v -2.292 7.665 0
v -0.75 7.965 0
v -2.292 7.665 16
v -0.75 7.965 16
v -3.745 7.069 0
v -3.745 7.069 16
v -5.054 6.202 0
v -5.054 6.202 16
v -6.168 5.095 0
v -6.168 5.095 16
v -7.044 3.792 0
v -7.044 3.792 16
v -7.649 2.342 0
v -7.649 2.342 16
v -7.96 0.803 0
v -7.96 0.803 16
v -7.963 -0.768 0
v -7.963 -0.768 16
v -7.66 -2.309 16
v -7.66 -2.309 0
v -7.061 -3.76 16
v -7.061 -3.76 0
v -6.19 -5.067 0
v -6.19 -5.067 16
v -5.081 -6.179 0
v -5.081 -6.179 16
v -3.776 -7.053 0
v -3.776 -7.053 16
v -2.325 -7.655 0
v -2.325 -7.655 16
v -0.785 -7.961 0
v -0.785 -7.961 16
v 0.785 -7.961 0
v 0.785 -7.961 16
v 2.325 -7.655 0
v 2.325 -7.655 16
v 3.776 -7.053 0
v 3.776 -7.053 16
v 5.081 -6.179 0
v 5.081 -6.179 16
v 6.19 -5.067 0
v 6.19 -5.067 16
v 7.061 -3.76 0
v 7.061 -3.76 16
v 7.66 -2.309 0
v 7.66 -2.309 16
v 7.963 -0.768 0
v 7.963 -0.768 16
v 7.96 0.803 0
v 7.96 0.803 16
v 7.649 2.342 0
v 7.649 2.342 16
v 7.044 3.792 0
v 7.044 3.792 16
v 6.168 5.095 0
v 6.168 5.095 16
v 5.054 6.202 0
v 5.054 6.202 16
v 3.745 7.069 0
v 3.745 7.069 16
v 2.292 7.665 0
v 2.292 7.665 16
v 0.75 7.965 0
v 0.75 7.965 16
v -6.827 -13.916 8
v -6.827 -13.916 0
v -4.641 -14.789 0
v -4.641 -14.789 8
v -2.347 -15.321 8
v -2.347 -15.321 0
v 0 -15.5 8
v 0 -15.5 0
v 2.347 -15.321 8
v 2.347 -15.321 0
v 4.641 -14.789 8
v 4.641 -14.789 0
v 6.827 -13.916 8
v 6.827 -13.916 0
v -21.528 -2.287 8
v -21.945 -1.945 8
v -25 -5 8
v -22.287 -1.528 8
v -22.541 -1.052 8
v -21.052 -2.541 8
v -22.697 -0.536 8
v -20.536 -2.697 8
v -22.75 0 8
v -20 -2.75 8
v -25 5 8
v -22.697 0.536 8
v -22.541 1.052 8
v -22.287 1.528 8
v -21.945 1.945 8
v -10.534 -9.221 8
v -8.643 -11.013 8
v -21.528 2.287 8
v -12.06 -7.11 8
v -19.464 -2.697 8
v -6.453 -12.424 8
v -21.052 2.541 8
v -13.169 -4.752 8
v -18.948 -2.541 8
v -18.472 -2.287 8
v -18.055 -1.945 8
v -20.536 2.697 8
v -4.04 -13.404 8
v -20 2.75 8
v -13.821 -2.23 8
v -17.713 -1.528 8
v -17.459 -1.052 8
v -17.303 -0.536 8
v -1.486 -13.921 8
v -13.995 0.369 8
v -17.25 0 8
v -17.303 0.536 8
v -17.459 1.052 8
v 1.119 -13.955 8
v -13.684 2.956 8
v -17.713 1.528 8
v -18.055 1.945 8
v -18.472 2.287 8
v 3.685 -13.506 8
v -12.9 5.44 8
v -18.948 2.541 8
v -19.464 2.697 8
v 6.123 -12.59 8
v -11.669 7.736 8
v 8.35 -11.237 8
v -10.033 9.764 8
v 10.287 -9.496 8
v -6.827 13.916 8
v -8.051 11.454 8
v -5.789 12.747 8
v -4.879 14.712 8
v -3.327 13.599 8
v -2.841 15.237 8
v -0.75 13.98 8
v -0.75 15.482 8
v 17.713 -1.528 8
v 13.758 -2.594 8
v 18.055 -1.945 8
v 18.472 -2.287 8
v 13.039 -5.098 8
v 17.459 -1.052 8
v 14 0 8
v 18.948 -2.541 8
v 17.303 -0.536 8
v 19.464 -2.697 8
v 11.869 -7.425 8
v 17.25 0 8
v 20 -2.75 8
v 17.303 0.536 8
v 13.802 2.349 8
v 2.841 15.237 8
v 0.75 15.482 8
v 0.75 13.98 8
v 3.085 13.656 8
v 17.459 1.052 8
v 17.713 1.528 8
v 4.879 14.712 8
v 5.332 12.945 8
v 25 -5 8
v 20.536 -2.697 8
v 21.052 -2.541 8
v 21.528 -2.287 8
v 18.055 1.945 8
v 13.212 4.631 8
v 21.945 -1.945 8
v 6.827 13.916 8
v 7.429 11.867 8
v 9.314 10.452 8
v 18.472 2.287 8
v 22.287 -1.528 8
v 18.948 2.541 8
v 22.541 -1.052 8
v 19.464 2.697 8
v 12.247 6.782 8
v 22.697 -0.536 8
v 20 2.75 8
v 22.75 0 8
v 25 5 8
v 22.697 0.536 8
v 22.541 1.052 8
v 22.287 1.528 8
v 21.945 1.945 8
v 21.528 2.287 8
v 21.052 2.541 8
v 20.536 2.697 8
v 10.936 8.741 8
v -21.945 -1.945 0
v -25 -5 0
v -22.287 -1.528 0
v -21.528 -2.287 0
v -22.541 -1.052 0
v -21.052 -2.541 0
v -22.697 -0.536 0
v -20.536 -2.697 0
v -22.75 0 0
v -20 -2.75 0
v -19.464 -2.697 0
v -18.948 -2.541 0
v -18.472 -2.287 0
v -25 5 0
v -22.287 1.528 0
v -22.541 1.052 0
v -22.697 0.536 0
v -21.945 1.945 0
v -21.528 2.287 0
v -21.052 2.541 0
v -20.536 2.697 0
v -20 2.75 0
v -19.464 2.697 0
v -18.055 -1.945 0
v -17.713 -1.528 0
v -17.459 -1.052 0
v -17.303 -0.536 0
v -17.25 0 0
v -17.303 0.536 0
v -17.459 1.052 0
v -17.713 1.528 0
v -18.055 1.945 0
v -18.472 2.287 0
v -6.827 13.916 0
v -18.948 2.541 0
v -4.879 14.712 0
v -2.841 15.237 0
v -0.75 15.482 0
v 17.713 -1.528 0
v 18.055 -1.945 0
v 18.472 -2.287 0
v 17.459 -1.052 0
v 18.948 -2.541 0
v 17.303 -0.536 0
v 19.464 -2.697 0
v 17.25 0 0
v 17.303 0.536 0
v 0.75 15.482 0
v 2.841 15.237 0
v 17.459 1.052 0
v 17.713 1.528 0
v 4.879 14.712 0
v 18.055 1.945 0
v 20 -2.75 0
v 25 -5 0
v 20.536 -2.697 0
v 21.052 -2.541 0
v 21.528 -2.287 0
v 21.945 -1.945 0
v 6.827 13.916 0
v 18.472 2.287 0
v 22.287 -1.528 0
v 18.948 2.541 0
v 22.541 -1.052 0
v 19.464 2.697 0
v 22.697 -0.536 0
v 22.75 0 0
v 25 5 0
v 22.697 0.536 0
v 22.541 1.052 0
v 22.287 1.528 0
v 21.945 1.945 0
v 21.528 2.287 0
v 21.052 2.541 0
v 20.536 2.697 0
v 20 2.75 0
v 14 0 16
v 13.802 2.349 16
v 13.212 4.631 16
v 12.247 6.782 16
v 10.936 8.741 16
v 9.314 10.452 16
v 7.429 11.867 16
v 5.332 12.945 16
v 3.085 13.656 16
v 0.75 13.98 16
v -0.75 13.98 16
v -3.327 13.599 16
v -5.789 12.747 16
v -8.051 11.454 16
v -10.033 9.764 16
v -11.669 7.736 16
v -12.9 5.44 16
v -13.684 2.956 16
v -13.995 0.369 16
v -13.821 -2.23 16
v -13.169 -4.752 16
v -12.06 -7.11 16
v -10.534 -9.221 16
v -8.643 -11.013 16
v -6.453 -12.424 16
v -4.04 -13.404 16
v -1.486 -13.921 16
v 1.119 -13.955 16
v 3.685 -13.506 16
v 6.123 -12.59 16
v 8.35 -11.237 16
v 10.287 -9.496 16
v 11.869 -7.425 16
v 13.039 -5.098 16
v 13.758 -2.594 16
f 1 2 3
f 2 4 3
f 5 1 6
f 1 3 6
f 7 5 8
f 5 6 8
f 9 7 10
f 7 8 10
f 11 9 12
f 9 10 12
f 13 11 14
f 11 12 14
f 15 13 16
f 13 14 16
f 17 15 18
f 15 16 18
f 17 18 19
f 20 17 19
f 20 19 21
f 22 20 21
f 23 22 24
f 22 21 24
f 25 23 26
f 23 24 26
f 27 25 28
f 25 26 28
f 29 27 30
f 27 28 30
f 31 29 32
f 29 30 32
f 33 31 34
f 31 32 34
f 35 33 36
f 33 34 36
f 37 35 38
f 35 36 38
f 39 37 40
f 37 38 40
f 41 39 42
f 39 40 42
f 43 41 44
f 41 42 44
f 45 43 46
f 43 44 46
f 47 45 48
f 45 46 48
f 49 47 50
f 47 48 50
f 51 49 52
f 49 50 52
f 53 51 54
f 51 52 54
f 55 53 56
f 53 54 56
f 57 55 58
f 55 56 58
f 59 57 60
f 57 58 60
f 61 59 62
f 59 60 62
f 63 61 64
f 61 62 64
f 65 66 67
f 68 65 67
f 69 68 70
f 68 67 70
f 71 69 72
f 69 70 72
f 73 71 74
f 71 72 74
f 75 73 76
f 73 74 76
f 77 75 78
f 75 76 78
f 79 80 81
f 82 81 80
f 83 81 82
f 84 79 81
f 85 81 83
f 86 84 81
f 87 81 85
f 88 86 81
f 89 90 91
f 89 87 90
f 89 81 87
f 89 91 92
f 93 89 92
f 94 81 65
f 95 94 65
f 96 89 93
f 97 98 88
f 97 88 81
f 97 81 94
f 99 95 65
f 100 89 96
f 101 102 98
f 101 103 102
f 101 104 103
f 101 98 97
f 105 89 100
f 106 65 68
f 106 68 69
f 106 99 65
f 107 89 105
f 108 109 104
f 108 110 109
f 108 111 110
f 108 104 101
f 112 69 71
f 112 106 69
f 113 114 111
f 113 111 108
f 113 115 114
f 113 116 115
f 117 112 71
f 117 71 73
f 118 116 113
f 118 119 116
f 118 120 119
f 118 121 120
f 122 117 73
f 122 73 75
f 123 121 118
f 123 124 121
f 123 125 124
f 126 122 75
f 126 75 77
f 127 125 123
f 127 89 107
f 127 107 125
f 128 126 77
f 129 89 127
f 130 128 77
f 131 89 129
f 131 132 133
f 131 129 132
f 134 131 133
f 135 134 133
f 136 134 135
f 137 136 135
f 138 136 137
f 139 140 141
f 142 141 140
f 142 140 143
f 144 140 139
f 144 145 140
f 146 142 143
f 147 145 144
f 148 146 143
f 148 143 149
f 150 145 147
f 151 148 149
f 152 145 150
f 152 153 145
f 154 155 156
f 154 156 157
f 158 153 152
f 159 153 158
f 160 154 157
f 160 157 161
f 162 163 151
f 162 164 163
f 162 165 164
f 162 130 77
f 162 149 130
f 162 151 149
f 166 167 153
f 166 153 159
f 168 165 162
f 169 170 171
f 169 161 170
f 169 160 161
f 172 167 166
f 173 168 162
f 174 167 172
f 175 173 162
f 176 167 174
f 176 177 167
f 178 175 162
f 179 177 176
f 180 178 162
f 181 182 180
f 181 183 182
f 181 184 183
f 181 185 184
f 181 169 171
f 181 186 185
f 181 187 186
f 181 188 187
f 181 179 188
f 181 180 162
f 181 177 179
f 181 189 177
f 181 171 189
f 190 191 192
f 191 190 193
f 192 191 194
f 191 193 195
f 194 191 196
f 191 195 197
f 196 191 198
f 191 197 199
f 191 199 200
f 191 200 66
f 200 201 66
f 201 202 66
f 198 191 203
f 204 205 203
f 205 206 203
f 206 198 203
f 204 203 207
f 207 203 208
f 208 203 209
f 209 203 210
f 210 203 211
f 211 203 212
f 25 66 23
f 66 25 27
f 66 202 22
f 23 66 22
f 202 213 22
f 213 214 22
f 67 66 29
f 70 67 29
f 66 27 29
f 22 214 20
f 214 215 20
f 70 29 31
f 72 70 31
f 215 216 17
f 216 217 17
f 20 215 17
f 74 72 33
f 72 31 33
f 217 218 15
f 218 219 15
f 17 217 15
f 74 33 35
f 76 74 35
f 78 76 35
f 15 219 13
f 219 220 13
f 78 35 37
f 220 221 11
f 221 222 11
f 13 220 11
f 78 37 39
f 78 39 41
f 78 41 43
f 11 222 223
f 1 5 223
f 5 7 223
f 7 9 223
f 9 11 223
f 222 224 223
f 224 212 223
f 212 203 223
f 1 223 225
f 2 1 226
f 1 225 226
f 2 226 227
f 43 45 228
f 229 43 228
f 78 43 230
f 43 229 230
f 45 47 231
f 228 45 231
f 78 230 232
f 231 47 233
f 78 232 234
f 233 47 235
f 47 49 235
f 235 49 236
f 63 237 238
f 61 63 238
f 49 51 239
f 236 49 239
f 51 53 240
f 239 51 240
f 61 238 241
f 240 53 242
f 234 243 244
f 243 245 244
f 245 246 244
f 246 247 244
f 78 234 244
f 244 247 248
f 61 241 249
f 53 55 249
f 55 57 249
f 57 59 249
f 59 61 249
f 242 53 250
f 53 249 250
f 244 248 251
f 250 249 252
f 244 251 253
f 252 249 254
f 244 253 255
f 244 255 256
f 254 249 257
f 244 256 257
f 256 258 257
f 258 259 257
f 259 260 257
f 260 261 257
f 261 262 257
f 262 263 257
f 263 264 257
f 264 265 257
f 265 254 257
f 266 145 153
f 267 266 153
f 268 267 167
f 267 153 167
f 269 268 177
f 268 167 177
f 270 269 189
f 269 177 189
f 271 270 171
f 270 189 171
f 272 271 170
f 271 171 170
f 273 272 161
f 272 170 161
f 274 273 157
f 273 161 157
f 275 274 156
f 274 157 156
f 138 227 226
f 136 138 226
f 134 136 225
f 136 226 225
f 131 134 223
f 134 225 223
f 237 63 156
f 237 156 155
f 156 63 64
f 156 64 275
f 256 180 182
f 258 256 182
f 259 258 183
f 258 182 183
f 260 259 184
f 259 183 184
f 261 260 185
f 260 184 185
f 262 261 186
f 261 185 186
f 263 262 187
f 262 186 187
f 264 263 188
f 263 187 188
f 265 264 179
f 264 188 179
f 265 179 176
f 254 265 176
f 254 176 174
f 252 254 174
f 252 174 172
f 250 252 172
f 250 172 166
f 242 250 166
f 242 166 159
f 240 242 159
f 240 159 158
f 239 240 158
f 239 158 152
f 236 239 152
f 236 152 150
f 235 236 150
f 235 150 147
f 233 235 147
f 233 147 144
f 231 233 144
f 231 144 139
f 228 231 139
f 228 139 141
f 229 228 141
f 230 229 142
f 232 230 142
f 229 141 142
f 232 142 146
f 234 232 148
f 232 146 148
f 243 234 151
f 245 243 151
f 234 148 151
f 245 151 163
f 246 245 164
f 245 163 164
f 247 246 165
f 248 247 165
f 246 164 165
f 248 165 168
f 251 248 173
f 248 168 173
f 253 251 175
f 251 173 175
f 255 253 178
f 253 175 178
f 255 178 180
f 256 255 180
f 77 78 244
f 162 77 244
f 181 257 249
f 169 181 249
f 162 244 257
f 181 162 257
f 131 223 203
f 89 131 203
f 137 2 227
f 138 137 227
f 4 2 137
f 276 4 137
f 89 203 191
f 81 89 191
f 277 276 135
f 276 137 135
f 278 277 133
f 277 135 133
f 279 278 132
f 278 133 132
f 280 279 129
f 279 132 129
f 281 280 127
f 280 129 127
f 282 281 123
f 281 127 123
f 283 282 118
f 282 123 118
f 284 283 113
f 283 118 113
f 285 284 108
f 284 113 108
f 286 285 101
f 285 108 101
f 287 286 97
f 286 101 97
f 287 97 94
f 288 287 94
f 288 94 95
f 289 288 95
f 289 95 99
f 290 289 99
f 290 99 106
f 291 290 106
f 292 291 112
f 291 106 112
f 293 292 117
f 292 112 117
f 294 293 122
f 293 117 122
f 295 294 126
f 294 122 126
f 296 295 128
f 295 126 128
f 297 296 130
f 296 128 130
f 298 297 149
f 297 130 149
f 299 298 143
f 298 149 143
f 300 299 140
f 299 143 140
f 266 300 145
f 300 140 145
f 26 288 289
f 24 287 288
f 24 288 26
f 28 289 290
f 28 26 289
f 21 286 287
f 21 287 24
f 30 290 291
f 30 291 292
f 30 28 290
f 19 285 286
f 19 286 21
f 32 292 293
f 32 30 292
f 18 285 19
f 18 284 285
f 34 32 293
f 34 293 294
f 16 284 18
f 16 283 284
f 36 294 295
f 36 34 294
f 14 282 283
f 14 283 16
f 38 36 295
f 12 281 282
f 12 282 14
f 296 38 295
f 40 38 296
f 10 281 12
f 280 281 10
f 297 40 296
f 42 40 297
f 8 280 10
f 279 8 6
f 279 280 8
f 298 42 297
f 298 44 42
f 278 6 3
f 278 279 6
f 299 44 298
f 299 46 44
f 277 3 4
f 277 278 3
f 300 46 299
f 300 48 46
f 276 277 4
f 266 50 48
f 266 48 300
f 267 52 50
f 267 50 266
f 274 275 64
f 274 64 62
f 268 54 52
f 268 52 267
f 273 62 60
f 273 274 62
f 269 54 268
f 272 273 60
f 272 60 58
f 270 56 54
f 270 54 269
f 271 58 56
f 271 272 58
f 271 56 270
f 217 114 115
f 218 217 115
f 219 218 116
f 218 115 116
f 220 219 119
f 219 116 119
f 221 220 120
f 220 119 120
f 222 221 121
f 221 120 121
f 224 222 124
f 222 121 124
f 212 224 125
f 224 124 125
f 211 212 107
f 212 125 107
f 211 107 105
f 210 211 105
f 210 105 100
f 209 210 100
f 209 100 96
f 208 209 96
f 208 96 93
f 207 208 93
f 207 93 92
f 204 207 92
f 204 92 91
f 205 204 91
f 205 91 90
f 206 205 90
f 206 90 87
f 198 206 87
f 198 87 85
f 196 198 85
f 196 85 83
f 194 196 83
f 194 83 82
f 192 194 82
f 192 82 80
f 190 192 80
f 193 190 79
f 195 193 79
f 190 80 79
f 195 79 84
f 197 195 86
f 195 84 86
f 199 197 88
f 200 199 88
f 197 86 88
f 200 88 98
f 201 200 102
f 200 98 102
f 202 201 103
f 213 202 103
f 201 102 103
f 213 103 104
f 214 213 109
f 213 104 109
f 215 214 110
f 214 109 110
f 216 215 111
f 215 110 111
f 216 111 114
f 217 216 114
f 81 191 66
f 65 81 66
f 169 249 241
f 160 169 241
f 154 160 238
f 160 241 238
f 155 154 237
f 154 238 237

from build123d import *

# Parameters (mm, degrees)
BOSS_EXTRUDE1_DEPTH = 8
SKETCH2_R           = 14
BOSS_EXTRUDE2_DEPTH = 8
SKETCH3_R           = 8
CUT_EXTRUDE1_DEPTH  = 17
SKETCH4_R           = 2.75
CUT_EXTRUDE2_DEPTH  = 9
SKETCH5_W           = 1.5
SKETCH5_H           = 20
CUT_EXTRUDE3_DEPTH  = 17


with BuildPart() as part:
    # Sketch1 → Boss-Extrude1 (new body)
    with BuildSketch(Plane.XY):
        with BuildLine():
            Line((-6.826881704, 13.915591478), (-25, 5))
            Line((-25, 5), (-25, -5))
            Line((-25, -5), (-6.826881704, -13.915591478))
            ThreePointArc((-6.826881704, -13.915591478), (0, -15.5), (6.826881704, -13.915591478))
            Line((6.826881704, -13.915591478), (25, -5))
            Line((25, -5), (25, 5))
            Line((25, 5), (6.826881704, 13.915591478))
            ThreePointArc((6.826881704, 13.915591478), (0, 15.5), (-6.826881704, 13.915591478))
        make_face()
    extrude(amount=BOSS_EXTRUDE1_DEPTH)

    # Sketch2 → Boss-Extrude2 (add)
    with BuildSketch(Plane.XY.offset(8)):
        Circle(SKETCH2_R)
    extrude(amount=BOSS_EXTRUDE2_DEPTH)

    # Sketch3 → Cut-Extrude1 (cut, through all)
    with BuildSketch(Plane.XY.offset(16)):
        Circle(SKETCH3_R)
    extrude(amount=-CUT_EXTRUDE1_DEPTH, mode=Mode.SUBTRACT)

    # Sketch4 → Cut-Extrude2 (cut, through all)
    with BuildSketch(Plane.XY.offset(8)):
        with Locations((-20, 0)):
            Circle(SKETCH4_R)
        with Locations((20, 0)):
            Circle(SKETCH4_R)
    extrude(amount=-CUT_EXTRUDE2_DEPTH, mode=Mode.SUBTRACT)

    # Sketch5 → Cut-Extrude3 (cut, through all)
    with BuildSketch(Plane.XY.offset(16)):
        with Locations((0, 15)):
            Rectangle(SKETCH5_W, SKETCH5_H)
    extrude(amount=-CUT_EXTRUDE3_DEPTH, mode=Mode.SUBTRACT)


solid = part.part
